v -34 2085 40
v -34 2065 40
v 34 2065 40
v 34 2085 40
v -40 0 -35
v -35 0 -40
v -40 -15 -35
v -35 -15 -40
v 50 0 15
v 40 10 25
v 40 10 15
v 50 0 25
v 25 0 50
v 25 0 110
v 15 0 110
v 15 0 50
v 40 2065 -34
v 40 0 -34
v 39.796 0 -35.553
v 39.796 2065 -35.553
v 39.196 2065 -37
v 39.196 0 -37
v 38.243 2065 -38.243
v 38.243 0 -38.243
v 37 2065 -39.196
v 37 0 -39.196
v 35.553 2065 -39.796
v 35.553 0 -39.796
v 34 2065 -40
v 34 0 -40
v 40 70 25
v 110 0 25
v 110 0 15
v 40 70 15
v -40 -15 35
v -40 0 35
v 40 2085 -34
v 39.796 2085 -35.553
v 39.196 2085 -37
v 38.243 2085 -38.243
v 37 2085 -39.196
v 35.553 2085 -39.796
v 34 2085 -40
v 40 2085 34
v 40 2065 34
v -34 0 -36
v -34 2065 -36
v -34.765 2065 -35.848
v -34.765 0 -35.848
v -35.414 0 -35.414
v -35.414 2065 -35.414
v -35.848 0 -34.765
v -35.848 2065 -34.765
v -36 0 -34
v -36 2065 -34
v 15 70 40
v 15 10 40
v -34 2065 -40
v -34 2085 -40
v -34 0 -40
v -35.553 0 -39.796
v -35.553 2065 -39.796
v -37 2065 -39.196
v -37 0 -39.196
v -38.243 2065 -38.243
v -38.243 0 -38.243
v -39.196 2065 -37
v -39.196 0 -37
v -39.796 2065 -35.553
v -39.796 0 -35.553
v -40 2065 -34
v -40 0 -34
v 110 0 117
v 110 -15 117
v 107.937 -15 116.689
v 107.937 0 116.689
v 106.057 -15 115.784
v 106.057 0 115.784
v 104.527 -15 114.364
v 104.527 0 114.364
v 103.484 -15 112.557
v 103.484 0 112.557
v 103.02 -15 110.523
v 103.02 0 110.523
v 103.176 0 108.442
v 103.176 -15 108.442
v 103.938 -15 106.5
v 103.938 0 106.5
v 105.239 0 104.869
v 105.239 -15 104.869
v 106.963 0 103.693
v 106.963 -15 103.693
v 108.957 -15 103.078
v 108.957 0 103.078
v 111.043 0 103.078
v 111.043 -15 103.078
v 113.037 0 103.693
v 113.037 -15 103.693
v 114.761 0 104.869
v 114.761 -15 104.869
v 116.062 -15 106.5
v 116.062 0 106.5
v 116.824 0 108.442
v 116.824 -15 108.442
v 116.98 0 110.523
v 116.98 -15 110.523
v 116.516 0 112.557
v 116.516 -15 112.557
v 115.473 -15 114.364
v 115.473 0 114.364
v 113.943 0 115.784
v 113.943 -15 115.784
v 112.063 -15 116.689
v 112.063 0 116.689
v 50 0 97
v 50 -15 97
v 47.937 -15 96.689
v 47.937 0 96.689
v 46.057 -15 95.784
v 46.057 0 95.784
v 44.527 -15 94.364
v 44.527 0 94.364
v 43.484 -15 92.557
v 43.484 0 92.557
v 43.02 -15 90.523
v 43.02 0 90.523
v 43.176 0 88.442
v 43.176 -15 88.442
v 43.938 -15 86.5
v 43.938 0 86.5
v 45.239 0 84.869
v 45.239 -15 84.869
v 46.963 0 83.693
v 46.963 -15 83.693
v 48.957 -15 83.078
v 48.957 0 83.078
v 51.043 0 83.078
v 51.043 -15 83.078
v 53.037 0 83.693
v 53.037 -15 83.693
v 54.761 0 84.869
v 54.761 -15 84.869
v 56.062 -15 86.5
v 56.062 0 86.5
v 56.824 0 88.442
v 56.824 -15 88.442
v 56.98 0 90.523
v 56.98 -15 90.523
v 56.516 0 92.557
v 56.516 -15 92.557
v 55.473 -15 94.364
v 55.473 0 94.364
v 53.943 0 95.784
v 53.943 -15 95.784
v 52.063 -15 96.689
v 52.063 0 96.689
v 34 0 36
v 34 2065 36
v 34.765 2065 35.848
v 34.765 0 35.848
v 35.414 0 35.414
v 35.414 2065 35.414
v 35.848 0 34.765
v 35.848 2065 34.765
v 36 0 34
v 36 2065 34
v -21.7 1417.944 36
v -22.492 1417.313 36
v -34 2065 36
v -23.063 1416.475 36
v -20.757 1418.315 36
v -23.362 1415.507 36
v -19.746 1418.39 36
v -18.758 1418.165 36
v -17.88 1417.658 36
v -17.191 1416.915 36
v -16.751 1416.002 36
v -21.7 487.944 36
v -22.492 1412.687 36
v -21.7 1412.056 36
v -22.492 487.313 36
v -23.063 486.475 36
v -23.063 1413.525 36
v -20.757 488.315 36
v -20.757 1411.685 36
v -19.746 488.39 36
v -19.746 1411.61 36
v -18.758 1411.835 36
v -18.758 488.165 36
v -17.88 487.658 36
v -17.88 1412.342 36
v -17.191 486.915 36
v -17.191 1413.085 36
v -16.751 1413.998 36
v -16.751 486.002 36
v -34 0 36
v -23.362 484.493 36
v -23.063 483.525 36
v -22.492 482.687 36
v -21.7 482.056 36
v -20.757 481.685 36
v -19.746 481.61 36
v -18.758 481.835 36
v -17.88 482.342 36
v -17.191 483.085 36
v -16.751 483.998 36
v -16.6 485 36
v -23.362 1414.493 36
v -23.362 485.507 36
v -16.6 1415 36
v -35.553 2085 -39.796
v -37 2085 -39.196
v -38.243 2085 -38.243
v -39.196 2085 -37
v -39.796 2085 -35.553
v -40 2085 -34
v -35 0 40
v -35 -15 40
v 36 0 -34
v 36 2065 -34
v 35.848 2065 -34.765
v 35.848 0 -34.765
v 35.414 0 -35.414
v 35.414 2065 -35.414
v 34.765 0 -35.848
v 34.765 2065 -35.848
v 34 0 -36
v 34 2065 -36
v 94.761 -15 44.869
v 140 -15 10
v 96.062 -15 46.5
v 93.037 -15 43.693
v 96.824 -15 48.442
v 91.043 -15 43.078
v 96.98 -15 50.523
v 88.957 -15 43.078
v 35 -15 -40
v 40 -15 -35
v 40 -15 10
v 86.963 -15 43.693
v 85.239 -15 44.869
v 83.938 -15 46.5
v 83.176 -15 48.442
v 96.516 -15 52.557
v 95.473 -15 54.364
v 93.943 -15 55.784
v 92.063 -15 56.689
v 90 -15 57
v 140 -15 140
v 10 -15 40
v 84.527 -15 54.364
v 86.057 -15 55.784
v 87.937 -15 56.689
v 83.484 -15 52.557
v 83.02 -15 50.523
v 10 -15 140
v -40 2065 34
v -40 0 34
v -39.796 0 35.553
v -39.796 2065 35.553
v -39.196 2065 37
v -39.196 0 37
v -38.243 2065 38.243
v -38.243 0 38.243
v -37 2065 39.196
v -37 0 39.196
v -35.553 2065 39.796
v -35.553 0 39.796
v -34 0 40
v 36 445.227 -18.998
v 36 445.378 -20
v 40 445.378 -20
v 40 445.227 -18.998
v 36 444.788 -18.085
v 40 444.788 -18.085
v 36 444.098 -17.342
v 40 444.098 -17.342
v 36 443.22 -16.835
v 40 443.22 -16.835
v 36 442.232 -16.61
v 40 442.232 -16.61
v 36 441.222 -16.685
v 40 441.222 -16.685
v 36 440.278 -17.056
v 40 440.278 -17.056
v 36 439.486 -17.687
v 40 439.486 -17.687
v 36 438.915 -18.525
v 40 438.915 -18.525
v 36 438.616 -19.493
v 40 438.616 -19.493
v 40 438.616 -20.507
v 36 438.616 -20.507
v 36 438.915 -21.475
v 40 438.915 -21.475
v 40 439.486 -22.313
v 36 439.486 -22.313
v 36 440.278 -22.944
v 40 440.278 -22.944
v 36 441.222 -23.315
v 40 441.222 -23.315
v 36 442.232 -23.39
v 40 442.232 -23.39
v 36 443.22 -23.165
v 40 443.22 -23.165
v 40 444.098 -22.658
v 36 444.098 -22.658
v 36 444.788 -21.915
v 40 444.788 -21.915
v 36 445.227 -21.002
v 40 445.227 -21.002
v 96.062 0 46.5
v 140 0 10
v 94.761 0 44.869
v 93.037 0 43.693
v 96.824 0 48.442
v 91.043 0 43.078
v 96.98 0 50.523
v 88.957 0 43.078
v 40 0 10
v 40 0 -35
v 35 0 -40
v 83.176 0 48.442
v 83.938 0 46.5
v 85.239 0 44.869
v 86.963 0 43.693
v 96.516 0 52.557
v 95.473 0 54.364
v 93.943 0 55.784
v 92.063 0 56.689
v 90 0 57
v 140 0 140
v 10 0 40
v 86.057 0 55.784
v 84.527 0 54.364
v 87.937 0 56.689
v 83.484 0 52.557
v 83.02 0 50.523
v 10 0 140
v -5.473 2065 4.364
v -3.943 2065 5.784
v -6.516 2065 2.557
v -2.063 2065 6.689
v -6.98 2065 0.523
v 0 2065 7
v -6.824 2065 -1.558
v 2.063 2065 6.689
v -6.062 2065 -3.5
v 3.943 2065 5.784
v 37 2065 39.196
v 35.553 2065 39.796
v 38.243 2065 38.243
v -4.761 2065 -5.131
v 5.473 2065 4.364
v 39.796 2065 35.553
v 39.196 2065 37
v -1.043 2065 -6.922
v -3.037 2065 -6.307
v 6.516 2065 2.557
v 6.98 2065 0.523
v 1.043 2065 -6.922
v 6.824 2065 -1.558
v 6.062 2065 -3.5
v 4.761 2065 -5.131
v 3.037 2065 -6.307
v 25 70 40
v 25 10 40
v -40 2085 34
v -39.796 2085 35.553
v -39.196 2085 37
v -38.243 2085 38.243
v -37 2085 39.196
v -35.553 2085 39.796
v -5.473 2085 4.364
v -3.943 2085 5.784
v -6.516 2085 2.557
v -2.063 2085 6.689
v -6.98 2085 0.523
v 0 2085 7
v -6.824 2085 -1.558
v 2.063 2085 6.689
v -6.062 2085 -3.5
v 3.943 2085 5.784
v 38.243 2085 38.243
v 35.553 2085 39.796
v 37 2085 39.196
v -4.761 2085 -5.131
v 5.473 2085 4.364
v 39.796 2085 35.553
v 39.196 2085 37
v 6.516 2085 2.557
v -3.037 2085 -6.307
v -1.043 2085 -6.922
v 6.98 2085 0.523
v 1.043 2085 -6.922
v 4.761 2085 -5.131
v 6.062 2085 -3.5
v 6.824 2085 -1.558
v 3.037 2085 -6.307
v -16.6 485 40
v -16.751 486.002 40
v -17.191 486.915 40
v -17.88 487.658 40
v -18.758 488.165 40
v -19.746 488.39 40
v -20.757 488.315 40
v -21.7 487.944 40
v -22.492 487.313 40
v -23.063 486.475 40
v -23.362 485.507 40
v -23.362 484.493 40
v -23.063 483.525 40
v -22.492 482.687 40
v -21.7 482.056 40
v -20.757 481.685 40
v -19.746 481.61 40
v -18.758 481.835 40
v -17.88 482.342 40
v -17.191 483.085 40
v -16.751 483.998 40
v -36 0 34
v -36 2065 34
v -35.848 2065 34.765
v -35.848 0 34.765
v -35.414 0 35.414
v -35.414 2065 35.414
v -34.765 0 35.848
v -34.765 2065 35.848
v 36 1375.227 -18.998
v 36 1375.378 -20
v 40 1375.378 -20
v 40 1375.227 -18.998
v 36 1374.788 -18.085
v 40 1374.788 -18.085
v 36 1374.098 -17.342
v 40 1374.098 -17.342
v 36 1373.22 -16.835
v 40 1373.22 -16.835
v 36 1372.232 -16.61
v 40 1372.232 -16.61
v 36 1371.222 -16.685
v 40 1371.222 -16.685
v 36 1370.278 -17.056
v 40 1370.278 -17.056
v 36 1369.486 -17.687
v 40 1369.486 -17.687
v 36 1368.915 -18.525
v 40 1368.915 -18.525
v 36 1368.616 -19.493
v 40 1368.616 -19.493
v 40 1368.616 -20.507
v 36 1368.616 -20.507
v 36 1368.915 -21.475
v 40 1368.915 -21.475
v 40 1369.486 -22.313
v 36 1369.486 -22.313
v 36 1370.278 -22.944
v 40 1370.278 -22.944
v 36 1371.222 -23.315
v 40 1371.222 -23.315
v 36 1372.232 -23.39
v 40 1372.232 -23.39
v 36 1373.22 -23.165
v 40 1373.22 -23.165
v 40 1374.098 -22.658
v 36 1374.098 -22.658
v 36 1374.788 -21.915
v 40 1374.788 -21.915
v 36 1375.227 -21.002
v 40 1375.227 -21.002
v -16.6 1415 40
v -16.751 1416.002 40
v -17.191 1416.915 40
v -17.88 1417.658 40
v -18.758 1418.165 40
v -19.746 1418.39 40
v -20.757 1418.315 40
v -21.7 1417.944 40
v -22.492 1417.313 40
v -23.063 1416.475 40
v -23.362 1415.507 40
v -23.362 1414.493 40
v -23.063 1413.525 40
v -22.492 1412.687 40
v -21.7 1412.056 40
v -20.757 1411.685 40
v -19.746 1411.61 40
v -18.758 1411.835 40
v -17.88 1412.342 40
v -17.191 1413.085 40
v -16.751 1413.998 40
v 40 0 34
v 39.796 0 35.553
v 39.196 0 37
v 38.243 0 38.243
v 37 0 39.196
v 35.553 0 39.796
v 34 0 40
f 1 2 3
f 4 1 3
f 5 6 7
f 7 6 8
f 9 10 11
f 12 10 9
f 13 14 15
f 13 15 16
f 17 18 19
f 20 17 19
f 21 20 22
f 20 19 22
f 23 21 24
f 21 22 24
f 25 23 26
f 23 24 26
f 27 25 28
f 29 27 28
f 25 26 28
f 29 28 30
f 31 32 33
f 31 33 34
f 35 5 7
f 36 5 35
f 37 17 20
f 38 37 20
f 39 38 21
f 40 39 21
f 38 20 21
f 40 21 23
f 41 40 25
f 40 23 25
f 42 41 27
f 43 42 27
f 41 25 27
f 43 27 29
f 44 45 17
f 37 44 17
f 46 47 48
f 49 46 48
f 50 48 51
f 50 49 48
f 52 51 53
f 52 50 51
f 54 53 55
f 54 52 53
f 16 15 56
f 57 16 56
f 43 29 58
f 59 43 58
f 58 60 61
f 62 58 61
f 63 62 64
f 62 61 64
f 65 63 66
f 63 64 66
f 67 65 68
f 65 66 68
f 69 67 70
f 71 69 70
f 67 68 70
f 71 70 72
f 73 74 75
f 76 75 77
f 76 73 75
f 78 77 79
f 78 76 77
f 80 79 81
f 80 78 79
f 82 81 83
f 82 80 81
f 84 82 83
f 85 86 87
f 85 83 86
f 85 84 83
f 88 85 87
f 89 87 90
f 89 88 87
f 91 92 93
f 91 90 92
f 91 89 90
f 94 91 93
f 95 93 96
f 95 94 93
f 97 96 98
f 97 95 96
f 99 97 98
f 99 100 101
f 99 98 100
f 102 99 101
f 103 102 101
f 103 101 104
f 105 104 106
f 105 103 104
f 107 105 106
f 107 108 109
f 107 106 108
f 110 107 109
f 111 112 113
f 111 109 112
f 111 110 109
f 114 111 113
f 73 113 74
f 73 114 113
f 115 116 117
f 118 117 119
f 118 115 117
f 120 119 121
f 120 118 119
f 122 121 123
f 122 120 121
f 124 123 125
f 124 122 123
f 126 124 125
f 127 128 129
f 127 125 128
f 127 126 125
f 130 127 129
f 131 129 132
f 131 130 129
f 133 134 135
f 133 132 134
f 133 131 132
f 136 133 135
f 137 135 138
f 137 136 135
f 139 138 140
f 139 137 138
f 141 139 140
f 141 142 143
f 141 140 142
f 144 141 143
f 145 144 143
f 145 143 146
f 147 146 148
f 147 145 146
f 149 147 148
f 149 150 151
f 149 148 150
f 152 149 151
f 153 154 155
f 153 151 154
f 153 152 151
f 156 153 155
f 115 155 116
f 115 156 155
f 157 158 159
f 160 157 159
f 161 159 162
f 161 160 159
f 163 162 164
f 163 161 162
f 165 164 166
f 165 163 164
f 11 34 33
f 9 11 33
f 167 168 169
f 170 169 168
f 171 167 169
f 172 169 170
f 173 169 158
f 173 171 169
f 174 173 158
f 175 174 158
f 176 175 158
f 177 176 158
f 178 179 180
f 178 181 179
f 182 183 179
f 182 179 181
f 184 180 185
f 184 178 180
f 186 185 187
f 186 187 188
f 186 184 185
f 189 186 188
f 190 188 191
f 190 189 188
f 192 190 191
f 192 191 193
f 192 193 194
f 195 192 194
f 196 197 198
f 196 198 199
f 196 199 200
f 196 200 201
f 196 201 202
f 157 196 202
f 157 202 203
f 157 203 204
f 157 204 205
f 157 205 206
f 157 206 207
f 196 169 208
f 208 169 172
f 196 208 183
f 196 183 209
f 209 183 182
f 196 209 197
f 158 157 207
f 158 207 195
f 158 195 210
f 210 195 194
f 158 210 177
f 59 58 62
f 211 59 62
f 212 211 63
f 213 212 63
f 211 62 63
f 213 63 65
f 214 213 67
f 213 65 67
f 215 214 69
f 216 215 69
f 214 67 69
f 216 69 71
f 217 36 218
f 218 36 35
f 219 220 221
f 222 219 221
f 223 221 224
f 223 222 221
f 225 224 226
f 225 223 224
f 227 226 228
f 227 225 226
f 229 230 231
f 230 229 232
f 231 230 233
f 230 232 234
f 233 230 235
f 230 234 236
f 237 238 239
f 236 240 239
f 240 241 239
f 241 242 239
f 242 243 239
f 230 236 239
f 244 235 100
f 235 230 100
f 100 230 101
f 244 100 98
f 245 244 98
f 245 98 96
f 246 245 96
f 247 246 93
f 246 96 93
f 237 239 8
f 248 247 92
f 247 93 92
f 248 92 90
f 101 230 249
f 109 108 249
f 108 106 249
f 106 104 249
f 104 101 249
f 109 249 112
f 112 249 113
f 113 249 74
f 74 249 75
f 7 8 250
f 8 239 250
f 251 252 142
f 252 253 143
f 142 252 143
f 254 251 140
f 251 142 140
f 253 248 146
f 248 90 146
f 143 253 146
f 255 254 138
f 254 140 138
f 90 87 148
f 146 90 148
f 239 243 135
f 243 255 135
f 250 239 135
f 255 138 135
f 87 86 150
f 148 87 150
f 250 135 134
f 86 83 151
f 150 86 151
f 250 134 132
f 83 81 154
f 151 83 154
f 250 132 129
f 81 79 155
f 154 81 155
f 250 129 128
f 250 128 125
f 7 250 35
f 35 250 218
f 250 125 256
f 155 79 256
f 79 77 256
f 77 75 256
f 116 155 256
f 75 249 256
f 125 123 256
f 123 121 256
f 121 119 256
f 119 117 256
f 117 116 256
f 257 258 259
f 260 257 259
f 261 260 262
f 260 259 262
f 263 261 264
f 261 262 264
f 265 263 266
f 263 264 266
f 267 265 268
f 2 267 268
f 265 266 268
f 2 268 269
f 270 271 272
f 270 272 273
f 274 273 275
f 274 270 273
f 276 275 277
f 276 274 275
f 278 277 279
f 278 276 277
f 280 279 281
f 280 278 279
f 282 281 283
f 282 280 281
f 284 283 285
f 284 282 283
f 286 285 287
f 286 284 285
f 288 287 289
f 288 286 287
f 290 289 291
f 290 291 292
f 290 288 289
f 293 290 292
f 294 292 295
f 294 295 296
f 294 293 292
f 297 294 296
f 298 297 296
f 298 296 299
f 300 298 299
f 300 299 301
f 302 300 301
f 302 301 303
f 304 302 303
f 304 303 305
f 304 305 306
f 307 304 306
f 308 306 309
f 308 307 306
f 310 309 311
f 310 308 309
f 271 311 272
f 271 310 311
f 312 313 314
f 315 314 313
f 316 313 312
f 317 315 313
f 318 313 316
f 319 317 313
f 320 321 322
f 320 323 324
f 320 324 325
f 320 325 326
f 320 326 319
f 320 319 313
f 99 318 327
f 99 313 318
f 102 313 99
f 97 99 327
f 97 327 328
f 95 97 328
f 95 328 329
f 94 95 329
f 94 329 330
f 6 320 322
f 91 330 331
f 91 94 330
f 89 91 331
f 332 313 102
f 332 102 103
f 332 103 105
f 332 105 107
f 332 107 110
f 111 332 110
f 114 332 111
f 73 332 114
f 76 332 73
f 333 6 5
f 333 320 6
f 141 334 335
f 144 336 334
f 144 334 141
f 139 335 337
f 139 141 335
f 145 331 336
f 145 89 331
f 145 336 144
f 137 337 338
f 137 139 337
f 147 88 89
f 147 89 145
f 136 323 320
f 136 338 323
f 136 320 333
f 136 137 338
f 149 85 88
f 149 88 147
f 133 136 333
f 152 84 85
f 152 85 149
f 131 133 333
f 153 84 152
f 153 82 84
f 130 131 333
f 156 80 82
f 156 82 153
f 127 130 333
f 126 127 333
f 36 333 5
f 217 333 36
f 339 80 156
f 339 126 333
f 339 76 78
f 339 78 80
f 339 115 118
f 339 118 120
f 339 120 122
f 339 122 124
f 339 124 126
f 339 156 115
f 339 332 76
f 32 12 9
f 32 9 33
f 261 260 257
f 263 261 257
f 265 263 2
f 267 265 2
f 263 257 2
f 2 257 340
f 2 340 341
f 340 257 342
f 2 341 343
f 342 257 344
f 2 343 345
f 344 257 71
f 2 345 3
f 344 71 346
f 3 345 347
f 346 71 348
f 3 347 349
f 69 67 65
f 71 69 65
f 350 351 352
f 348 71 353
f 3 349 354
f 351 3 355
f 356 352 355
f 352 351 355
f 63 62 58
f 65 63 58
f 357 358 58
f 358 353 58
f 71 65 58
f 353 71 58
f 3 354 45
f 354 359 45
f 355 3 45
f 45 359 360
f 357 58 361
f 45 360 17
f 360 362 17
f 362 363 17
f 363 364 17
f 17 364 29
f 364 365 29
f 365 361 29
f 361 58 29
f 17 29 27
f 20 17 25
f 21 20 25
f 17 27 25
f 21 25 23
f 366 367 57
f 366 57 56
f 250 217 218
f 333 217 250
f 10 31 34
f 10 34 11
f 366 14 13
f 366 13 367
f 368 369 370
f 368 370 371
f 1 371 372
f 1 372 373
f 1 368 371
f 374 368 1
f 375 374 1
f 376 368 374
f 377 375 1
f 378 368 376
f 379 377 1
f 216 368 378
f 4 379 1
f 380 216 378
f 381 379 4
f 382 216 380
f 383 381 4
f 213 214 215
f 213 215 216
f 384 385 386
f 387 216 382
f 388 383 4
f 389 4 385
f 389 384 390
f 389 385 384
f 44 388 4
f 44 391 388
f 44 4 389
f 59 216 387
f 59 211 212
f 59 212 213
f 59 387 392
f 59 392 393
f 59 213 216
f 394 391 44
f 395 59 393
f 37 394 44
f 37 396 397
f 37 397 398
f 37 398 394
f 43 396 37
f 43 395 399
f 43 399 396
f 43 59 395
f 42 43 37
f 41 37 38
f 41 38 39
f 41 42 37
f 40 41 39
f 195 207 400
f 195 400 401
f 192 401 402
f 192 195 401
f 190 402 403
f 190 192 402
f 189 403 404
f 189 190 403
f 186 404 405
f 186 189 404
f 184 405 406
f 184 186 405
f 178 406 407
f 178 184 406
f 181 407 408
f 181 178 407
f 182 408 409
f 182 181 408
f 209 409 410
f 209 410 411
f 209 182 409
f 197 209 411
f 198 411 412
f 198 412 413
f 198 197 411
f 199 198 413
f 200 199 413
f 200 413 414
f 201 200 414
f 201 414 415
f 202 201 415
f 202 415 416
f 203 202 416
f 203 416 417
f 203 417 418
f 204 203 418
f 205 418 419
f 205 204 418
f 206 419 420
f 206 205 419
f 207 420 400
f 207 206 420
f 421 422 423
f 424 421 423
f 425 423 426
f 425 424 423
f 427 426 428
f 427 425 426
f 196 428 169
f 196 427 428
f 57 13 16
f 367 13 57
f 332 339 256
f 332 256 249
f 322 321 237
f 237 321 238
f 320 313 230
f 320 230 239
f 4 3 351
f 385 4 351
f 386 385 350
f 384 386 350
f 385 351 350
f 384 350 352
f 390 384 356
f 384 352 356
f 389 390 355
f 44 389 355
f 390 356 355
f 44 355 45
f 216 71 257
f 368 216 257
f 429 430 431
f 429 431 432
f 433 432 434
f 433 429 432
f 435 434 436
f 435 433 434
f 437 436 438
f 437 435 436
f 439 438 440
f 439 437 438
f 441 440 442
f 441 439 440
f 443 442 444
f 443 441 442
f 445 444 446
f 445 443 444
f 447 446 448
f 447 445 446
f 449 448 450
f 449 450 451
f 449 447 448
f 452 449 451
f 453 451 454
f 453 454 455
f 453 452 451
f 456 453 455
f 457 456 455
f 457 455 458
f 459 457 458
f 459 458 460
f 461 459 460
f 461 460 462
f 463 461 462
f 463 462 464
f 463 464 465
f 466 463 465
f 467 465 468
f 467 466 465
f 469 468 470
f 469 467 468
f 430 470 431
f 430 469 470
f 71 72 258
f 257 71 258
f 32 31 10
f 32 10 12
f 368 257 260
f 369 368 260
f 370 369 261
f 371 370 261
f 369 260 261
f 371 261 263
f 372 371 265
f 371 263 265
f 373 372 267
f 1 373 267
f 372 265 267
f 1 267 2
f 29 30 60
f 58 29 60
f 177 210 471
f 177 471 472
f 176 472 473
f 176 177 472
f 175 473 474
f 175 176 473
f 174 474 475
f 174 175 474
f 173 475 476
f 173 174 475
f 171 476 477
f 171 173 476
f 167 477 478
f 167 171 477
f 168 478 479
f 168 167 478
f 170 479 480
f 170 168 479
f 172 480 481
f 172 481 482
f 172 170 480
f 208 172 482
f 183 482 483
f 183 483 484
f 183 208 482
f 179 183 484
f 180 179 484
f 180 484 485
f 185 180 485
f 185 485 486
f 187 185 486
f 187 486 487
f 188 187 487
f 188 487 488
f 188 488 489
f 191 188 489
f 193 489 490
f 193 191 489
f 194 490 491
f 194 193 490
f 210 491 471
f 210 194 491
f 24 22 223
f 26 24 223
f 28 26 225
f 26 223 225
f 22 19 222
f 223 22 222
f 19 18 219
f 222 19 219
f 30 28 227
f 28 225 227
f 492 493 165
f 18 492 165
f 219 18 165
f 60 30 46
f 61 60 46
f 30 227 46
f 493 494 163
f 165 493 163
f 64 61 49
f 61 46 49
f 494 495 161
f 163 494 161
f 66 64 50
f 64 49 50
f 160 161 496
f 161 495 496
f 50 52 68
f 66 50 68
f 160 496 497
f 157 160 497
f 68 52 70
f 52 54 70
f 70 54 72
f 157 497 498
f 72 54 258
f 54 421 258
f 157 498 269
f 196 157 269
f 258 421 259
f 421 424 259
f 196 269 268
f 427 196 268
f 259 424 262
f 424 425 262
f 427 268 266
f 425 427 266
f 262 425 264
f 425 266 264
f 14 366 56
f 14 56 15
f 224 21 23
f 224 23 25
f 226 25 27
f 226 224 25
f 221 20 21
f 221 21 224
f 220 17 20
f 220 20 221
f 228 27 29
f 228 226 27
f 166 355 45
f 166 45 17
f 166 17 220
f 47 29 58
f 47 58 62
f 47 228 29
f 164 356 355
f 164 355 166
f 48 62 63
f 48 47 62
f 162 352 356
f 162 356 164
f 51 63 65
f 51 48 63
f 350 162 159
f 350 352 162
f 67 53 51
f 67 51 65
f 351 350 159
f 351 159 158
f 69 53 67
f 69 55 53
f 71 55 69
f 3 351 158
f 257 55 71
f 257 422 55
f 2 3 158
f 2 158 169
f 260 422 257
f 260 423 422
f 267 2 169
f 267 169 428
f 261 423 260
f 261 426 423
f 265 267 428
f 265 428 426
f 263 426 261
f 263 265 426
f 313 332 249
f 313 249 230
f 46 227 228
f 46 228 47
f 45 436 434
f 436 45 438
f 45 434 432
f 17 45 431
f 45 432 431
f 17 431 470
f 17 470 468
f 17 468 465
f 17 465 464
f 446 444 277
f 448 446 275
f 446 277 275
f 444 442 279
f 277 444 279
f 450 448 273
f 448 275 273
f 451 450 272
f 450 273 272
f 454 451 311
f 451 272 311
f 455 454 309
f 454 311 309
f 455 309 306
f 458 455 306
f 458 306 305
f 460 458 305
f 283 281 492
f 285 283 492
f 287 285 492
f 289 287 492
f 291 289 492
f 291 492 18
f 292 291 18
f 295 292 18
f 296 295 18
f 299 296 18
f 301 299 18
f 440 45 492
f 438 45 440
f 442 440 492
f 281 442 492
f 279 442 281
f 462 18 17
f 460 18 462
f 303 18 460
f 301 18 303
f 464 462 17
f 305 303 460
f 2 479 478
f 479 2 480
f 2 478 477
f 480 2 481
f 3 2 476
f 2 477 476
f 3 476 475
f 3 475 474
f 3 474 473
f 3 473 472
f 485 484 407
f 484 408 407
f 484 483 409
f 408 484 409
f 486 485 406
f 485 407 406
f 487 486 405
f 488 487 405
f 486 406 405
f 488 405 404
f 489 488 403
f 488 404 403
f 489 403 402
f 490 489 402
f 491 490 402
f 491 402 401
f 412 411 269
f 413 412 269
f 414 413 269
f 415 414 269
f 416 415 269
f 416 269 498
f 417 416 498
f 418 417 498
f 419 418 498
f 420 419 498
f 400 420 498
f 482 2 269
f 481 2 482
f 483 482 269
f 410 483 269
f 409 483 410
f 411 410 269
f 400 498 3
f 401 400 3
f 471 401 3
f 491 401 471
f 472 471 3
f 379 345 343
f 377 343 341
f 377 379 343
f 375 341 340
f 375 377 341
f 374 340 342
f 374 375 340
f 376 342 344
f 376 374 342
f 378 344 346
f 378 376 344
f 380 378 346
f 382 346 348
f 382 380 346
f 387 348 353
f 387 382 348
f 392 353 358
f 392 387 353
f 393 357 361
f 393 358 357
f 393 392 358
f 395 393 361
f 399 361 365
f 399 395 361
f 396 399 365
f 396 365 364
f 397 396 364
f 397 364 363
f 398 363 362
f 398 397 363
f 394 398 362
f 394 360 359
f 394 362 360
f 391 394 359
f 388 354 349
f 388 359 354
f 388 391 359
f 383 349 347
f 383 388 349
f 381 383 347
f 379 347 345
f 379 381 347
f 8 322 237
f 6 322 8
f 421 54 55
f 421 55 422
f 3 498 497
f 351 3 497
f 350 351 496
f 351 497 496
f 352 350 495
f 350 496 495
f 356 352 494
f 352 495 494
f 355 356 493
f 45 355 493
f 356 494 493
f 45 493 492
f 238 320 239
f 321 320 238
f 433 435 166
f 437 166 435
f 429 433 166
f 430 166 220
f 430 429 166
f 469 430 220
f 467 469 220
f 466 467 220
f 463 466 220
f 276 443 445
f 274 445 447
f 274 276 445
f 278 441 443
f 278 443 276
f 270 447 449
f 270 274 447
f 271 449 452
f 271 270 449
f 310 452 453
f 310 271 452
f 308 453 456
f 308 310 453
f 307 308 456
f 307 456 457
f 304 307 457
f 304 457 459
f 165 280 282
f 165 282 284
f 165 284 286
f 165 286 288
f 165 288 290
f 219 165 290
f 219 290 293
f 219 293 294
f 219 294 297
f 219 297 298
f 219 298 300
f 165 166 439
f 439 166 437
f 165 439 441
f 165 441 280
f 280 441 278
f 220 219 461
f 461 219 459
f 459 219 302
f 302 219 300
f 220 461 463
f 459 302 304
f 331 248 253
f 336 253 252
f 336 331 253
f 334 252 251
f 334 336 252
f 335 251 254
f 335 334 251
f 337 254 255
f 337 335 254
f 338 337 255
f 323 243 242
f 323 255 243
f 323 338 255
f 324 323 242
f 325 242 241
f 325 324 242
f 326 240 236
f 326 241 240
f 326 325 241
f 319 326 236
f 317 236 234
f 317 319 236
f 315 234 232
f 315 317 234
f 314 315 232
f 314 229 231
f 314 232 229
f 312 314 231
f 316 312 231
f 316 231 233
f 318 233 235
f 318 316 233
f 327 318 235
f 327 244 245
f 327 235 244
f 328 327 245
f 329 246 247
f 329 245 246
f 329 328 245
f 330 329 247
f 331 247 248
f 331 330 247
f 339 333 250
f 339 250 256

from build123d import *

# Parameters (mm, degrees)
MEMBER_1_DEPTH                   = 2065
EXTRUDE_1_DEPTH                  = 15
HOLE_WIZARD_14_0_14_1_AT_2_COUNT = 2
HOLE_WIZARD_14_0_14_1_AT_2_PITCH = 63.245553203
HOLE_WIZARD_14_0_14_1_AT_3_COUNT = 2
HOLE_WIZARD_14_0_14_1_AT_3_PITCH = 63.245553203
EXTRUDE_2_DEPTH                  = 10
EXTRUDE_3_DEPTH                  = 10
CHAMFER_1_SIZE                   = 5
EXTRUDE_6_DEPTH                  = 20
HOLE_START                       = 36
HOLE_WIZARD_M8_1_OUTLINE_R       = 3.4
HOLE_WIZARD_M8_1_DEPTH           = 4
HOLE_WIZARD_M8_2_OUTLINE_R       = 3.4
HOLE_WIZARD_M8_2_DEPTH           = 4


# Read off the part's stored shape, not the designer's step: M8 螺纹孔1, M8 螺纹孔2
with BuildPart() as part:
    # Sketch11 → Member 1 (new body)
    with BuildSketch(Plane(origin=(0, 0, 0), x_dir=(-1, 0, 0), z_dir=(0, 1, 0))):
        with BuildLine():
            Line((-34, -40), (34, -40))
            ThreePointArc((34, -40), (38.242640687, -38.242640687), (40, -34))
            Line((40, -34), (40, 34))
            ThreePointArc((40, 34), (38.242640687, 38.242640687), (34, 40))
            Line((34, 40), (-34, 40))
            ThreePointArc((-34, 40), (-38.242640687, 38.242640687), (-40, 34))
            Line((-40, 34), (-40, -34))
            ThreePointArc((-40, -34), (-38.242640687, -38.242640687), (-34, -40))
        make_face()
        with BuildLine():
            Line((-34, -36), (34, -36))
            ThreePointArc((34, -36), (35.414213562, -35.414213562), (36, -34))
            Line((36, -34), (36, 34))
            ThreePointArc((36, 34), (35.414213562, 35.414213562), (34, 36))
            Line((34, 36), (-34, 36))
            ThreePointArc((-34, 36), (-35.414213562, 35.414213562), (-36, 34))
            Line((-36, 34), (-36, -34))
            ThreePointArc((-36, -34), (-35.414213562, -35.414213562), (-34, -36))
        make_face(mode=Mode.SUBTRACT)
    extrude(amount=MEMBER_1_DEPTH)

    # M8 螺纹孔1 outline → M8 螺纹孔1 (cut)
    with BuildSketch(Plane.XY.offset(HOLE_START)):
        with Locations((-20, 485)):
            Circle(HOLE_WIZARD_M8_1_OUTLINE_R)
        with Locations((-20, 1415)):
            Circle(HOLE_WIZARD_M8_1_OUTLINE_R)
    extrude(amount=HOLE_WIZARD_M8_1_DEPTH, mode=Mode.SUBTRACT)

    # M8 螺纹孔2 outline → M8 螺纹孔2 (cut)
    with BuildSketch(Plane.YZ.offset(HOLE_START)):
        with Locations((441.978336483, -19.999999762)):
            Circle(HOLE_WIZARD_M8_2_OUTLINE_R)
        with Locations((1371.978336483, -19.999999762)):
            Circle(HOLE_WIZARD_M8_2_OUTLINE_R)
    extrude(amount=HOLE_WIZARD_M8_2_DEPTH, mode=Mode.SUBTRACT)


with BuildPart() as body_2:
    # 草图3 → 凸台-拉伸1 (new body)
    with BuildSketch(Plane.XZ):
        Polygon((10, 40), (10, 140), (140, 140), (140, 10), (40, 10), (40, -40), (-40, -40), (-40, 40), align=None)
    extrude(amount=EXTRUDE_1_DEPTH)

    # 草图4 → Ø14.0 (14) 直径孔1 (revolve, cut)
    with BuildSketch(Plane(origin=(110, 0, 110), x_dir=(0, 0, 1), z_dir=(1, 0, 0))):
        Polygon((0, 0), (0, 44.206024333), (7, 40), (7, 0), align=None)
    hole_wizard_14_0_14_1 = revolve(axis=Axis((110, 6.35, 110), (0, -1, 0)), mode=Mode.SUBTRACT)

    # Ø14.0 (14) 直径孔1 at 2: Ø14.0 (14) 直径孔1 ×2
    with Locations(*[Vector(-0.9486832980505139, 0, -0.316227766016838) * (i * HOLE_WIZARD_14_0_14_1_AT_2_PITCH) for i in range(1, HOLE_WIZARD_14_0_14_1_AT_2_COUNT)]):
        add(hole_wizard_14_0_14_1, mode=Mode.SUBTRACT)

    # Ø14.0 (14) 直径孔1 at 3: Ø14.0 (14) 直径孔1 ×2
    with Locations(*[Vector(-0.3162277660168379, 0, -0.9486832980505139) * (i * HOLE_WIZARD_14_0_14_1_AT_3_PITCH) for i in range(1, HOLE_WIZARD_14_0_14_1_AT_3_COUNT)]):
        add(hole_wizard_14_0_14_1, mode=Mode.SUBTRACT)

    # 倒角1
    chamfer_1_edges = [body_2.edges().sort_by_distance(p)[0] for p in [
        (-40, -7.5, 40),
        (40, -7.5, -40),
        (-40, -7.5, -40),
    ]]
    chamfer(chamfer_1_edges, length=CHAMFER_1_SIZE)


with BuildPart() as body_3:
    # 草图6 → 凸台-拉伸2 (new body)
    with BuildSketch(Plane.ZY.offset(-25)):
        Polygon((40, 70), (110, 0), (50, 0), (40, 10), align=None)
    extrude(amount=EXTRUDE_2_DEPTH)


with BuildPart() as body_4:
    # 草图7 → 凸台-拉伸3 (new body)
    with BuildSketch(Plane(origin=(0, 0, 25), x_dir=(-1, 0, 0), z_dir=(0, 0, -1))):
        Polygon((-40, 70), (-40, 10), (-50, 0), (-110, 0), align=None)
    extrude(amount=EXTRUDE_3_DEPTH)


with BuildPart() as body_5:
    # 草图26 → 凸台-拉伸6 (new body)
    with BuildSketch(Plane(origin=(0, 2065, 0), x_dir=(1, 0, 0), z_dir=(0, 1, 0))):
        with BuildLine():
            Line((-34, -40), (34, -40))
            ThreePointArc((34, -40), (38.242640687, -38.242640687), (40, -34))
            Line((40, -34), (40, 34))
            ThreePointArc((40, 34), (38.242640687, 38.242640687), (34, 40))
            Line((34, 40), (-34, 40))
            ThreePointArc((-34, 40), (-38.242640687, 38.242640687), (-40, 34))
            Line((-40, 34), (-40, -34))
            ThreePointArc((-40, -34), (-38.242640687, -38.242640687), (-34, -40))
        make_face()
    extrude(amount=EXTRUDE_6_DEPTH)

    # 草图27 → M16 螺纹孔1 (revolve, cut)
    with BuildSketch(Plane(origin=(0, 2085, 0), x_dir=(0, 0, 1), z_dir=(1, 0, 0))):
        Polygon((0, 0), (0, 46.206024333), (7, 42), (7, 0), align=None)
    revolve(axis=Axis((0, 2091.35, 0), (0, -1, 0)), mode=Mode.SUBTRACT)


solid = Compound([part.part, body_2.part, body_3.part, body_4.part, body_5.part])
